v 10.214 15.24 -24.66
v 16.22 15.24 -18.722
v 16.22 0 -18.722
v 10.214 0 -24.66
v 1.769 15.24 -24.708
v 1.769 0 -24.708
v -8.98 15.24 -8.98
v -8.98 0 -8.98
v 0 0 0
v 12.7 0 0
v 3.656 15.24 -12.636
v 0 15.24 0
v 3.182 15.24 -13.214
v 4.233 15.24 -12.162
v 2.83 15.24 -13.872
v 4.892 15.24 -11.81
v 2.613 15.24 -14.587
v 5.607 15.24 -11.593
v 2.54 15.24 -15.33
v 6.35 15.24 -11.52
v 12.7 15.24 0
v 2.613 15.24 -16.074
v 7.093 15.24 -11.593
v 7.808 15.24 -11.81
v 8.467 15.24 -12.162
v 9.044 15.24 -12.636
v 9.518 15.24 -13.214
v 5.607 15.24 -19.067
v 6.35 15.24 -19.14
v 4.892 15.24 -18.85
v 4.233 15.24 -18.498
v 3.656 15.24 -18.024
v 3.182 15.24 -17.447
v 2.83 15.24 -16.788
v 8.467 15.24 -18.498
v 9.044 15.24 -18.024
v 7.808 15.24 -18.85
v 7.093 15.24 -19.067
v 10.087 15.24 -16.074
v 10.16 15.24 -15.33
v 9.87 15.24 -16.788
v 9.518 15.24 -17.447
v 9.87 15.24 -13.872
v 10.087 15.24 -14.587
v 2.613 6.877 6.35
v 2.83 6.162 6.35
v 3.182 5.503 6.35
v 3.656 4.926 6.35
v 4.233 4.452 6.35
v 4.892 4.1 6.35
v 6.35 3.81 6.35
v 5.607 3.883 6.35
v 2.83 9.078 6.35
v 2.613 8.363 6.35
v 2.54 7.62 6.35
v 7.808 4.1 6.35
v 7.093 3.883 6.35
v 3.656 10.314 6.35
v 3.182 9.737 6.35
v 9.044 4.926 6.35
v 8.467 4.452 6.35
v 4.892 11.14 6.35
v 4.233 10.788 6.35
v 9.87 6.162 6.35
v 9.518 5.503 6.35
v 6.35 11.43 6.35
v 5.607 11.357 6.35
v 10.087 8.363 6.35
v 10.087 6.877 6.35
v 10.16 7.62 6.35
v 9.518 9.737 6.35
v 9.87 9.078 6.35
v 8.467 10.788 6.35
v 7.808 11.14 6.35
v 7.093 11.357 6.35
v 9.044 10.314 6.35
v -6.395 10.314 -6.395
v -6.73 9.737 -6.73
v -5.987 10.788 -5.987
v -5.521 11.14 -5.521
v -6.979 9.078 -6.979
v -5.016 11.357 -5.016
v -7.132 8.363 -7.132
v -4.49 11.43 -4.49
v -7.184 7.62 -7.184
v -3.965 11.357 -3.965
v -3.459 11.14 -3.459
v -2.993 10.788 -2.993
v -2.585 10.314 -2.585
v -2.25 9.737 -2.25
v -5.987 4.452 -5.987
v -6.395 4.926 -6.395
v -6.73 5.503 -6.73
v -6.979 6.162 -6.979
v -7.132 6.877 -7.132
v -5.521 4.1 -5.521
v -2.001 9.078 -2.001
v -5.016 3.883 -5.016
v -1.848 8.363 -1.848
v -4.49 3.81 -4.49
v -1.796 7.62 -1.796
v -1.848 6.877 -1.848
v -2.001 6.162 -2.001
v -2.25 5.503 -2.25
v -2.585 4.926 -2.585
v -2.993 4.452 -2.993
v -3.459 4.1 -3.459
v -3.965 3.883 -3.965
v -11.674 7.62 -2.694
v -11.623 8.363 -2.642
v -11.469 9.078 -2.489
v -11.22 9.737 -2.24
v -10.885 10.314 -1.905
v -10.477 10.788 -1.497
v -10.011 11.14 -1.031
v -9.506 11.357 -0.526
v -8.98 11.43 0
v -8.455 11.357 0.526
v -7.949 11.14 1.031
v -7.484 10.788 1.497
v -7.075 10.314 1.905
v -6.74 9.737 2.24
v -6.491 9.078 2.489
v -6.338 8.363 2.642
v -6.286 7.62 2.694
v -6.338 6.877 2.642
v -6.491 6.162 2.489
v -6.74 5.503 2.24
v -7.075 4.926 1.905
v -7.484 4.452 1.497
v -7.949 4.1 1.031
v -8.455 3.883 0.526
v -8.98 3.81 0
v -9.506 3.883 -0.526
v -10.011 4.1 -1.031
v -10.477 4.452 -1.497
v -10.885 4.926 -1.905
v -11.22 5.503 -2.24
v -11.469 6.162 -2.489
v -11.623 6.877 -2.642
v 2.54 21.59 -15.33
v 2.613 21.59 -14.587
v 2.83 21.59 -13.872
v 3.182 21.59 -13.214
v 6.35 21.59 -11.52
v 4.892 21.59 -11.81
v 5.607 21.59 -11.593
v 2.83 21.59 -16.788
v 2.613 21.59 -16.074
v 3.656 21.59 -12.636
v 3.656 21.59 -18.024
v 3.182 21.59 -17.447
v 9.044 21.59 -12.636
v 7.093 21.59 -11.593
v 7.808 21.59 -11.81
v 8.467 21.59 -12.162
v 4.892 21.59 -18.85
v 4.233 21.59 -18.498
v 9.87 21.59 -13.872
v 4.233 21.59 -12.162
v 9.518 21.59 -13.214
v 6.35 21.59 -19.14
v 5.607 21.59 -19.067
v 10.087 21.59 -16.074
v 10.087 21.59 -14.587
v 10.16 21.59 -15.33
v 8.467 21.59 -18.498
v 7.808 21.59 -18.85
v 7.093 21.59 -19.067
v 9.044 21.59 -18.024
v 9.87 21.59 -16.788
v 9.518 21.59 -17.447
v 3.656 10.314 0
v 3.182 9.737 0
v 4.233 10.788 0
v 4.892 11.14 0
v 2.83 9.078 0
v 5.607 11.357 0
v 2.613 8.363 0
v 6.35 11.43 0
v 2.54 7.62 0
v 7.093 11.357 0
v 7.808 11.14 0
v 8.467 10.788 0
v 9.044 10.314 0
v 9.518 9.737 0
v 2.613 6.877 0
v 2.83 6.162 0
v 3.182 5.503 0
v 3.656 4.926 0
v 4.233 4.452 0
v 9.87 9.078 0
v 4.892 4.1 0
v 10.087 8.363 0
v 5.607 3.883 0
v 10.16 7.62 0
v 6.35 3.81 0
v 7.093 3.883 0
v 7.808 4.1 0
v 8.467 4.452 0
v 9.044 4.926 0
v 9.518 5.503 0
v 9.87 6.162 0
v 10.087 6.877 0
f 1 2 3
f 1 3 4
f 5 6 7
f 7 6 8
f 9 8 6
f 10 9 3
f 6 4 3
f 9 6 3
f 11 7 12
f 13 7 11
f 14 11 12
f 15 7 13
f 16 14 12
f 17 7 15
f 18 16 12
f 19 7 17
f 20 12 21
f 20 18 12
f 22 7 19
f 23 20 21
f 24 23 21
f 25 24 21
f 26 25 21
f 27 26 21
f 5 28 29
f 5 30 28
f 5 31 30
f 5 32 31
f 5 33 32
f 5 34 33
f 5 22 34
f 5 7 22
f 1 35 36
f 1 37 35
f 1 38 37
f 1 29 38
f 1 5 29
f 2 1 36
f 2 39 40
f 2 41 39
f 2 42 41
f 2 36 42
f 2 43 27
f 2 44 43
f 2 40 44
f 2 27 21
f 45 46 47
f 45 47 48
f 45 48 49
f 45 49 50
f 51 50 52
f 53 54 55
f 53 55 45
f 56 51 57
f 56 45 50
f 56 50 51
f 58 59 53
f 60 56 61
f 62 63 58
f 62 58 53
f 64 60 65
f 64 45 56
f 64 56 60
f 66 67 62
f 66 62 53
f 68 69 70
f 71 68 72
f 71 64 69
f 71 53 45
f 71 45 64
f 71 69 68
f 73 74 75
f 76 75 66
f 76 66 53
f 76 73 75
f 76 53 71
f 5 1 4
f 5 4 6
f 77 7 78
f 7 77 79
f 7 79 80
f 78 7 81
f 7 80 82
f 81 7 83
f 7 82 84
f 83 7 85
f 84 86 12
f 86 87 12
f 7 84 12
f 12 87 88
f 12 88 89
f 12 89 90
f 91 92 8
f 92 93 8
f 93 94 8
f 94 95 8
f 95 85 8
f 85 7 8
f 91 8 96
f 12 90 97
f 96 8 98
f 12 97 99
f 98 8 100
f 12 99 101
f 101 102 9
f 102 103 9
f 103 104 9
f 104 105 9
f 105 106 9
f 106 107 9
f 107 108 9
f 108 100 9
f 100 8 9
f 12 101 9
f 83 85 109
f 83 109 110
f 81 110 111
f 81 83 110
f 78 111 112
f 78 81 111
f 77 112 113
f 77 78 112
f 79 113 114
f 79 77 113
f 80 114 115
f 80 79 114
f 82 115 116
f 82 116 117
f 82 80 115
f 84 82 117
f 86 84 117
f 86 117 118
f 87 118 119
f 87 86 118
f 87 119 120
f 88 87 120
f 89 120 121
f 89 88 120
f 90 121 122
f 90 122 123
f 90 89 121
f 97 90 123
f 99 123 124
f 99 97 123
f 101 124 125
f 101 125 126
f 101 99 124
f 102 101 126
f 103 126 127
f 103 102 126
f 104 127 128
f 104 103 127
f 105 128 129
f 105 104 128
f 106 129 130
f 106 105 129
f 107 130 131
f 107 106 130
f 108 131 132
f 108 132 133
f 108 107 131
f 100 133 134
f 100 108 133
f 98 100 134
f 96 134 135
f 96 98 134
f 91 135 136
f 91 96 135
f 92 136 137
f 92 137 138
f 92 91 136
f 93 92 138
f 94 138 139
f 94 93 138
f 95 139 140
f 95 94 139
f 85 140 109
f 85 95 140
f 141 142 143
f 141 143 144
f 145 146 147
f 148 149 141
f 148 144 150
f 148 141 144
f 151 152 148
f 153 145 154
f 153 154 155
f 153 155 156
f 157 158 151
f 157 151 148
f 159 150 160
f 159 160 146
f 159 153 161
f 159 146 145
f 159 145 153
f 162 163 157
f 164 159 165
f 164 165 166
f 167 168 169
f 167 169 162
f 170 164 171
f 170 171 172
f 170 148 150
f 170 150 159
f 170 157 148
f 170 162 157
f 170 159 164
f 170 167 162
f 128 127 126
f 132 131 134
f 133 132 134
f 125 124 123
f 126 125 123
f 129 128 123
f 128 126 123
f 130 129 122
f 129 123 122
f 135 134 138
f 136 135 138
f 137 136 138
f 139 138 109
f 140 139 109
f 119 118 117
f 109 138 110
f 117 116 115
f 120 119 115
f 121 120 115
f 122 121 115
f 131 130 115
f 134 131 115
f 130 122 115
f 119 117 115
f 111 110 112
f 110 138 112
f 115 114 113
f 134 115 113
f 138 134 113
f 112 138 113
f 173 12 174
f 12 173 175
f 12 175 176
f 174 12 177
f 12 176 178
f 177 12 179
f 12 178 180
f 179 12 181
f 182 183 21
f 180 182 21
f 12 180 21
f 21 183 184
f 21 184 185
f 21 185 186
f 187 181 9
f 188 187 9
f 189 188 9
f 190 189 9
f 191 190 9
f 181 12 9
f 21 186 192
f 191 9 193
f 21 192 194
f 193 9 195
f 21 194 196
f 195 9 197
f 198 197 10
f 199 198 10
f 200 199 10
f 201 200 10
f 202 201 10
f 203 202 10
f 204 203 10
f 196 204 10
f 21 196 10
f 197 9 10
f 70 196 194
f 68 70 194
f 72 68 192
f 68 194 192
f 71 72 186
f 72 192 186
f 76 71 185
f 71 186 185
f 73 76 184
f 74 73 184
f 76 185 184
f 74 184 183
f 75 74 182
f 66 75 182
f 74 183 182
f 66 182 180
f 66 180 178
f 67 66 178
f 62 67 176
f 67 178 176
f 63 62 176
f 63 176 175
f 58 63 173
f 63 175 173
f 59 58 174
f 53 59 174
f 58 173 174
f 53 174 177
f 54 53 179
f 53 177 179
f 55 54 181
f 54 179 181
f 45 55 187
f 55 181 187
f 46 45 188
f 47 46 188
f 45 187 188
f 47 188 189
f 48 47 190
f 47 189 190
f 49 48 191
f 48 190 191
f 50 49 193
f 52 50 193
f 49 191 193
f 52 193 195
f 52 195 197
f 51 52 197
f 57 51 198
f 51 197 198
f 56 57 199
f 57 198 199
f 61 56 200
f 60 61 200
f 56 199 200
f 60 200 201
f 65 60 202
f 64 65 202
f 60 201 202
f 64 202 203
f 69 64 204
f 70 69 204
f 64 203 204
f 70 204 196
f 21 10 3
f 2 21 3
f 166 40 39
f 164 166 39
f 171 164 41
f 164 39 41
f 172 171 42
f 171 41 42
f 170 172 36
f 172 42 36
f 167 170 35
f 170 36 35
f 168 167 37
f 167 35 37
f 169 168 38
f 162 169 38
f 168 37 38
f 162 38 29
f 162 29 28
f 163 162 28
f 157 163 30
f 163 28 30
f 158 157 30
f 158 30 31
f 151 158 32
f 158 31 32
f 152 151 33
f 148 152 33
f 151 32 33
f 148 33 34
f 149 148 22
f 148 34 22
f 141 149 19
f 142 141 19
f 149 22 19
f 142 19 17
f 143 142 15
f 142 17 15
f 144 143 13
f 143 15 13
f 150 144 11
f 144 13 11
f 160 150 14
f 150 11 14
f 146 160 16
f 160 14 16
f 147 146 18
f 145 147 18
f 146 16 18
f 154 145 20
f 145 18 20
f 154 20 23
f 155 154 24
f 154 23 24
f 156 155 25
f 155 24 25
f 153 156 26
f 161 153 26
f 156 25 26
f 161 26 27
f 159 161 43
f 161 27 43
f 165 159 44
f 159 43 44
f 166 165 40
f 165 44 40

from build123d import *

# Parameters (mm, degrees)
BOSS_EXTRUDE1_DEPTH = 15.24
SKETCH2_R           = 3.81
BOSS_EXTRUDE2_DEPTH = 6.35
SKETCH5_R           = 3.81
BOSS_EXTRUDE3_DEPTH = 6.35


with BuildPart() as part:
    # Sketch1 → Boss-Extrude1 (new body)
    with BuildSketch(Plane(origin=(0, 0, 0), x_dir=(1, 0, 0), z_dir=(0, 1, 0))):
        Polygon((-8.980256121, 8.980256121), (0, 0), (12.7, 0), (16.220075072, 18.721954265), (10.214331376, 24.659577338), (1.769095743, 24.707745892), align=None)
    extrude(amount=BOSS_EXTRUDE1_DEPTH)

    # Sketch2 → Boss-Extrude2 (add)
    with BuildSketch(Plane.XY):
        with Locations((6.35, 7.62)):
            Circle(SKETCH2_R)
    boss_extrude2 = extrude(amount=BOSS_EXTRUDE2_DEPTH)

    # Mirror1: Boss-Extrude2 across plane
    add(boss_extrude2.mirror(Plane(origin=(0, 0, 0), x_dir=(-0.382683432, 0, 0.923879533), z_dir=(0.923879533, 0, 0.382683432))))

    # Sketch5 → Boss-Extrude3 (add)
    with BuildSketch(Plane(origin=(0, 15.24, 0), x_dir=(1, 0, 0), z_dir=(0, 1, 0))):
        with Locations((6.35, 15.330256121)):
            Circle(SKETCH5_R)
    extrude(amount=BOSS_EXTRUDE3_DEPTH)


solid = part.part
